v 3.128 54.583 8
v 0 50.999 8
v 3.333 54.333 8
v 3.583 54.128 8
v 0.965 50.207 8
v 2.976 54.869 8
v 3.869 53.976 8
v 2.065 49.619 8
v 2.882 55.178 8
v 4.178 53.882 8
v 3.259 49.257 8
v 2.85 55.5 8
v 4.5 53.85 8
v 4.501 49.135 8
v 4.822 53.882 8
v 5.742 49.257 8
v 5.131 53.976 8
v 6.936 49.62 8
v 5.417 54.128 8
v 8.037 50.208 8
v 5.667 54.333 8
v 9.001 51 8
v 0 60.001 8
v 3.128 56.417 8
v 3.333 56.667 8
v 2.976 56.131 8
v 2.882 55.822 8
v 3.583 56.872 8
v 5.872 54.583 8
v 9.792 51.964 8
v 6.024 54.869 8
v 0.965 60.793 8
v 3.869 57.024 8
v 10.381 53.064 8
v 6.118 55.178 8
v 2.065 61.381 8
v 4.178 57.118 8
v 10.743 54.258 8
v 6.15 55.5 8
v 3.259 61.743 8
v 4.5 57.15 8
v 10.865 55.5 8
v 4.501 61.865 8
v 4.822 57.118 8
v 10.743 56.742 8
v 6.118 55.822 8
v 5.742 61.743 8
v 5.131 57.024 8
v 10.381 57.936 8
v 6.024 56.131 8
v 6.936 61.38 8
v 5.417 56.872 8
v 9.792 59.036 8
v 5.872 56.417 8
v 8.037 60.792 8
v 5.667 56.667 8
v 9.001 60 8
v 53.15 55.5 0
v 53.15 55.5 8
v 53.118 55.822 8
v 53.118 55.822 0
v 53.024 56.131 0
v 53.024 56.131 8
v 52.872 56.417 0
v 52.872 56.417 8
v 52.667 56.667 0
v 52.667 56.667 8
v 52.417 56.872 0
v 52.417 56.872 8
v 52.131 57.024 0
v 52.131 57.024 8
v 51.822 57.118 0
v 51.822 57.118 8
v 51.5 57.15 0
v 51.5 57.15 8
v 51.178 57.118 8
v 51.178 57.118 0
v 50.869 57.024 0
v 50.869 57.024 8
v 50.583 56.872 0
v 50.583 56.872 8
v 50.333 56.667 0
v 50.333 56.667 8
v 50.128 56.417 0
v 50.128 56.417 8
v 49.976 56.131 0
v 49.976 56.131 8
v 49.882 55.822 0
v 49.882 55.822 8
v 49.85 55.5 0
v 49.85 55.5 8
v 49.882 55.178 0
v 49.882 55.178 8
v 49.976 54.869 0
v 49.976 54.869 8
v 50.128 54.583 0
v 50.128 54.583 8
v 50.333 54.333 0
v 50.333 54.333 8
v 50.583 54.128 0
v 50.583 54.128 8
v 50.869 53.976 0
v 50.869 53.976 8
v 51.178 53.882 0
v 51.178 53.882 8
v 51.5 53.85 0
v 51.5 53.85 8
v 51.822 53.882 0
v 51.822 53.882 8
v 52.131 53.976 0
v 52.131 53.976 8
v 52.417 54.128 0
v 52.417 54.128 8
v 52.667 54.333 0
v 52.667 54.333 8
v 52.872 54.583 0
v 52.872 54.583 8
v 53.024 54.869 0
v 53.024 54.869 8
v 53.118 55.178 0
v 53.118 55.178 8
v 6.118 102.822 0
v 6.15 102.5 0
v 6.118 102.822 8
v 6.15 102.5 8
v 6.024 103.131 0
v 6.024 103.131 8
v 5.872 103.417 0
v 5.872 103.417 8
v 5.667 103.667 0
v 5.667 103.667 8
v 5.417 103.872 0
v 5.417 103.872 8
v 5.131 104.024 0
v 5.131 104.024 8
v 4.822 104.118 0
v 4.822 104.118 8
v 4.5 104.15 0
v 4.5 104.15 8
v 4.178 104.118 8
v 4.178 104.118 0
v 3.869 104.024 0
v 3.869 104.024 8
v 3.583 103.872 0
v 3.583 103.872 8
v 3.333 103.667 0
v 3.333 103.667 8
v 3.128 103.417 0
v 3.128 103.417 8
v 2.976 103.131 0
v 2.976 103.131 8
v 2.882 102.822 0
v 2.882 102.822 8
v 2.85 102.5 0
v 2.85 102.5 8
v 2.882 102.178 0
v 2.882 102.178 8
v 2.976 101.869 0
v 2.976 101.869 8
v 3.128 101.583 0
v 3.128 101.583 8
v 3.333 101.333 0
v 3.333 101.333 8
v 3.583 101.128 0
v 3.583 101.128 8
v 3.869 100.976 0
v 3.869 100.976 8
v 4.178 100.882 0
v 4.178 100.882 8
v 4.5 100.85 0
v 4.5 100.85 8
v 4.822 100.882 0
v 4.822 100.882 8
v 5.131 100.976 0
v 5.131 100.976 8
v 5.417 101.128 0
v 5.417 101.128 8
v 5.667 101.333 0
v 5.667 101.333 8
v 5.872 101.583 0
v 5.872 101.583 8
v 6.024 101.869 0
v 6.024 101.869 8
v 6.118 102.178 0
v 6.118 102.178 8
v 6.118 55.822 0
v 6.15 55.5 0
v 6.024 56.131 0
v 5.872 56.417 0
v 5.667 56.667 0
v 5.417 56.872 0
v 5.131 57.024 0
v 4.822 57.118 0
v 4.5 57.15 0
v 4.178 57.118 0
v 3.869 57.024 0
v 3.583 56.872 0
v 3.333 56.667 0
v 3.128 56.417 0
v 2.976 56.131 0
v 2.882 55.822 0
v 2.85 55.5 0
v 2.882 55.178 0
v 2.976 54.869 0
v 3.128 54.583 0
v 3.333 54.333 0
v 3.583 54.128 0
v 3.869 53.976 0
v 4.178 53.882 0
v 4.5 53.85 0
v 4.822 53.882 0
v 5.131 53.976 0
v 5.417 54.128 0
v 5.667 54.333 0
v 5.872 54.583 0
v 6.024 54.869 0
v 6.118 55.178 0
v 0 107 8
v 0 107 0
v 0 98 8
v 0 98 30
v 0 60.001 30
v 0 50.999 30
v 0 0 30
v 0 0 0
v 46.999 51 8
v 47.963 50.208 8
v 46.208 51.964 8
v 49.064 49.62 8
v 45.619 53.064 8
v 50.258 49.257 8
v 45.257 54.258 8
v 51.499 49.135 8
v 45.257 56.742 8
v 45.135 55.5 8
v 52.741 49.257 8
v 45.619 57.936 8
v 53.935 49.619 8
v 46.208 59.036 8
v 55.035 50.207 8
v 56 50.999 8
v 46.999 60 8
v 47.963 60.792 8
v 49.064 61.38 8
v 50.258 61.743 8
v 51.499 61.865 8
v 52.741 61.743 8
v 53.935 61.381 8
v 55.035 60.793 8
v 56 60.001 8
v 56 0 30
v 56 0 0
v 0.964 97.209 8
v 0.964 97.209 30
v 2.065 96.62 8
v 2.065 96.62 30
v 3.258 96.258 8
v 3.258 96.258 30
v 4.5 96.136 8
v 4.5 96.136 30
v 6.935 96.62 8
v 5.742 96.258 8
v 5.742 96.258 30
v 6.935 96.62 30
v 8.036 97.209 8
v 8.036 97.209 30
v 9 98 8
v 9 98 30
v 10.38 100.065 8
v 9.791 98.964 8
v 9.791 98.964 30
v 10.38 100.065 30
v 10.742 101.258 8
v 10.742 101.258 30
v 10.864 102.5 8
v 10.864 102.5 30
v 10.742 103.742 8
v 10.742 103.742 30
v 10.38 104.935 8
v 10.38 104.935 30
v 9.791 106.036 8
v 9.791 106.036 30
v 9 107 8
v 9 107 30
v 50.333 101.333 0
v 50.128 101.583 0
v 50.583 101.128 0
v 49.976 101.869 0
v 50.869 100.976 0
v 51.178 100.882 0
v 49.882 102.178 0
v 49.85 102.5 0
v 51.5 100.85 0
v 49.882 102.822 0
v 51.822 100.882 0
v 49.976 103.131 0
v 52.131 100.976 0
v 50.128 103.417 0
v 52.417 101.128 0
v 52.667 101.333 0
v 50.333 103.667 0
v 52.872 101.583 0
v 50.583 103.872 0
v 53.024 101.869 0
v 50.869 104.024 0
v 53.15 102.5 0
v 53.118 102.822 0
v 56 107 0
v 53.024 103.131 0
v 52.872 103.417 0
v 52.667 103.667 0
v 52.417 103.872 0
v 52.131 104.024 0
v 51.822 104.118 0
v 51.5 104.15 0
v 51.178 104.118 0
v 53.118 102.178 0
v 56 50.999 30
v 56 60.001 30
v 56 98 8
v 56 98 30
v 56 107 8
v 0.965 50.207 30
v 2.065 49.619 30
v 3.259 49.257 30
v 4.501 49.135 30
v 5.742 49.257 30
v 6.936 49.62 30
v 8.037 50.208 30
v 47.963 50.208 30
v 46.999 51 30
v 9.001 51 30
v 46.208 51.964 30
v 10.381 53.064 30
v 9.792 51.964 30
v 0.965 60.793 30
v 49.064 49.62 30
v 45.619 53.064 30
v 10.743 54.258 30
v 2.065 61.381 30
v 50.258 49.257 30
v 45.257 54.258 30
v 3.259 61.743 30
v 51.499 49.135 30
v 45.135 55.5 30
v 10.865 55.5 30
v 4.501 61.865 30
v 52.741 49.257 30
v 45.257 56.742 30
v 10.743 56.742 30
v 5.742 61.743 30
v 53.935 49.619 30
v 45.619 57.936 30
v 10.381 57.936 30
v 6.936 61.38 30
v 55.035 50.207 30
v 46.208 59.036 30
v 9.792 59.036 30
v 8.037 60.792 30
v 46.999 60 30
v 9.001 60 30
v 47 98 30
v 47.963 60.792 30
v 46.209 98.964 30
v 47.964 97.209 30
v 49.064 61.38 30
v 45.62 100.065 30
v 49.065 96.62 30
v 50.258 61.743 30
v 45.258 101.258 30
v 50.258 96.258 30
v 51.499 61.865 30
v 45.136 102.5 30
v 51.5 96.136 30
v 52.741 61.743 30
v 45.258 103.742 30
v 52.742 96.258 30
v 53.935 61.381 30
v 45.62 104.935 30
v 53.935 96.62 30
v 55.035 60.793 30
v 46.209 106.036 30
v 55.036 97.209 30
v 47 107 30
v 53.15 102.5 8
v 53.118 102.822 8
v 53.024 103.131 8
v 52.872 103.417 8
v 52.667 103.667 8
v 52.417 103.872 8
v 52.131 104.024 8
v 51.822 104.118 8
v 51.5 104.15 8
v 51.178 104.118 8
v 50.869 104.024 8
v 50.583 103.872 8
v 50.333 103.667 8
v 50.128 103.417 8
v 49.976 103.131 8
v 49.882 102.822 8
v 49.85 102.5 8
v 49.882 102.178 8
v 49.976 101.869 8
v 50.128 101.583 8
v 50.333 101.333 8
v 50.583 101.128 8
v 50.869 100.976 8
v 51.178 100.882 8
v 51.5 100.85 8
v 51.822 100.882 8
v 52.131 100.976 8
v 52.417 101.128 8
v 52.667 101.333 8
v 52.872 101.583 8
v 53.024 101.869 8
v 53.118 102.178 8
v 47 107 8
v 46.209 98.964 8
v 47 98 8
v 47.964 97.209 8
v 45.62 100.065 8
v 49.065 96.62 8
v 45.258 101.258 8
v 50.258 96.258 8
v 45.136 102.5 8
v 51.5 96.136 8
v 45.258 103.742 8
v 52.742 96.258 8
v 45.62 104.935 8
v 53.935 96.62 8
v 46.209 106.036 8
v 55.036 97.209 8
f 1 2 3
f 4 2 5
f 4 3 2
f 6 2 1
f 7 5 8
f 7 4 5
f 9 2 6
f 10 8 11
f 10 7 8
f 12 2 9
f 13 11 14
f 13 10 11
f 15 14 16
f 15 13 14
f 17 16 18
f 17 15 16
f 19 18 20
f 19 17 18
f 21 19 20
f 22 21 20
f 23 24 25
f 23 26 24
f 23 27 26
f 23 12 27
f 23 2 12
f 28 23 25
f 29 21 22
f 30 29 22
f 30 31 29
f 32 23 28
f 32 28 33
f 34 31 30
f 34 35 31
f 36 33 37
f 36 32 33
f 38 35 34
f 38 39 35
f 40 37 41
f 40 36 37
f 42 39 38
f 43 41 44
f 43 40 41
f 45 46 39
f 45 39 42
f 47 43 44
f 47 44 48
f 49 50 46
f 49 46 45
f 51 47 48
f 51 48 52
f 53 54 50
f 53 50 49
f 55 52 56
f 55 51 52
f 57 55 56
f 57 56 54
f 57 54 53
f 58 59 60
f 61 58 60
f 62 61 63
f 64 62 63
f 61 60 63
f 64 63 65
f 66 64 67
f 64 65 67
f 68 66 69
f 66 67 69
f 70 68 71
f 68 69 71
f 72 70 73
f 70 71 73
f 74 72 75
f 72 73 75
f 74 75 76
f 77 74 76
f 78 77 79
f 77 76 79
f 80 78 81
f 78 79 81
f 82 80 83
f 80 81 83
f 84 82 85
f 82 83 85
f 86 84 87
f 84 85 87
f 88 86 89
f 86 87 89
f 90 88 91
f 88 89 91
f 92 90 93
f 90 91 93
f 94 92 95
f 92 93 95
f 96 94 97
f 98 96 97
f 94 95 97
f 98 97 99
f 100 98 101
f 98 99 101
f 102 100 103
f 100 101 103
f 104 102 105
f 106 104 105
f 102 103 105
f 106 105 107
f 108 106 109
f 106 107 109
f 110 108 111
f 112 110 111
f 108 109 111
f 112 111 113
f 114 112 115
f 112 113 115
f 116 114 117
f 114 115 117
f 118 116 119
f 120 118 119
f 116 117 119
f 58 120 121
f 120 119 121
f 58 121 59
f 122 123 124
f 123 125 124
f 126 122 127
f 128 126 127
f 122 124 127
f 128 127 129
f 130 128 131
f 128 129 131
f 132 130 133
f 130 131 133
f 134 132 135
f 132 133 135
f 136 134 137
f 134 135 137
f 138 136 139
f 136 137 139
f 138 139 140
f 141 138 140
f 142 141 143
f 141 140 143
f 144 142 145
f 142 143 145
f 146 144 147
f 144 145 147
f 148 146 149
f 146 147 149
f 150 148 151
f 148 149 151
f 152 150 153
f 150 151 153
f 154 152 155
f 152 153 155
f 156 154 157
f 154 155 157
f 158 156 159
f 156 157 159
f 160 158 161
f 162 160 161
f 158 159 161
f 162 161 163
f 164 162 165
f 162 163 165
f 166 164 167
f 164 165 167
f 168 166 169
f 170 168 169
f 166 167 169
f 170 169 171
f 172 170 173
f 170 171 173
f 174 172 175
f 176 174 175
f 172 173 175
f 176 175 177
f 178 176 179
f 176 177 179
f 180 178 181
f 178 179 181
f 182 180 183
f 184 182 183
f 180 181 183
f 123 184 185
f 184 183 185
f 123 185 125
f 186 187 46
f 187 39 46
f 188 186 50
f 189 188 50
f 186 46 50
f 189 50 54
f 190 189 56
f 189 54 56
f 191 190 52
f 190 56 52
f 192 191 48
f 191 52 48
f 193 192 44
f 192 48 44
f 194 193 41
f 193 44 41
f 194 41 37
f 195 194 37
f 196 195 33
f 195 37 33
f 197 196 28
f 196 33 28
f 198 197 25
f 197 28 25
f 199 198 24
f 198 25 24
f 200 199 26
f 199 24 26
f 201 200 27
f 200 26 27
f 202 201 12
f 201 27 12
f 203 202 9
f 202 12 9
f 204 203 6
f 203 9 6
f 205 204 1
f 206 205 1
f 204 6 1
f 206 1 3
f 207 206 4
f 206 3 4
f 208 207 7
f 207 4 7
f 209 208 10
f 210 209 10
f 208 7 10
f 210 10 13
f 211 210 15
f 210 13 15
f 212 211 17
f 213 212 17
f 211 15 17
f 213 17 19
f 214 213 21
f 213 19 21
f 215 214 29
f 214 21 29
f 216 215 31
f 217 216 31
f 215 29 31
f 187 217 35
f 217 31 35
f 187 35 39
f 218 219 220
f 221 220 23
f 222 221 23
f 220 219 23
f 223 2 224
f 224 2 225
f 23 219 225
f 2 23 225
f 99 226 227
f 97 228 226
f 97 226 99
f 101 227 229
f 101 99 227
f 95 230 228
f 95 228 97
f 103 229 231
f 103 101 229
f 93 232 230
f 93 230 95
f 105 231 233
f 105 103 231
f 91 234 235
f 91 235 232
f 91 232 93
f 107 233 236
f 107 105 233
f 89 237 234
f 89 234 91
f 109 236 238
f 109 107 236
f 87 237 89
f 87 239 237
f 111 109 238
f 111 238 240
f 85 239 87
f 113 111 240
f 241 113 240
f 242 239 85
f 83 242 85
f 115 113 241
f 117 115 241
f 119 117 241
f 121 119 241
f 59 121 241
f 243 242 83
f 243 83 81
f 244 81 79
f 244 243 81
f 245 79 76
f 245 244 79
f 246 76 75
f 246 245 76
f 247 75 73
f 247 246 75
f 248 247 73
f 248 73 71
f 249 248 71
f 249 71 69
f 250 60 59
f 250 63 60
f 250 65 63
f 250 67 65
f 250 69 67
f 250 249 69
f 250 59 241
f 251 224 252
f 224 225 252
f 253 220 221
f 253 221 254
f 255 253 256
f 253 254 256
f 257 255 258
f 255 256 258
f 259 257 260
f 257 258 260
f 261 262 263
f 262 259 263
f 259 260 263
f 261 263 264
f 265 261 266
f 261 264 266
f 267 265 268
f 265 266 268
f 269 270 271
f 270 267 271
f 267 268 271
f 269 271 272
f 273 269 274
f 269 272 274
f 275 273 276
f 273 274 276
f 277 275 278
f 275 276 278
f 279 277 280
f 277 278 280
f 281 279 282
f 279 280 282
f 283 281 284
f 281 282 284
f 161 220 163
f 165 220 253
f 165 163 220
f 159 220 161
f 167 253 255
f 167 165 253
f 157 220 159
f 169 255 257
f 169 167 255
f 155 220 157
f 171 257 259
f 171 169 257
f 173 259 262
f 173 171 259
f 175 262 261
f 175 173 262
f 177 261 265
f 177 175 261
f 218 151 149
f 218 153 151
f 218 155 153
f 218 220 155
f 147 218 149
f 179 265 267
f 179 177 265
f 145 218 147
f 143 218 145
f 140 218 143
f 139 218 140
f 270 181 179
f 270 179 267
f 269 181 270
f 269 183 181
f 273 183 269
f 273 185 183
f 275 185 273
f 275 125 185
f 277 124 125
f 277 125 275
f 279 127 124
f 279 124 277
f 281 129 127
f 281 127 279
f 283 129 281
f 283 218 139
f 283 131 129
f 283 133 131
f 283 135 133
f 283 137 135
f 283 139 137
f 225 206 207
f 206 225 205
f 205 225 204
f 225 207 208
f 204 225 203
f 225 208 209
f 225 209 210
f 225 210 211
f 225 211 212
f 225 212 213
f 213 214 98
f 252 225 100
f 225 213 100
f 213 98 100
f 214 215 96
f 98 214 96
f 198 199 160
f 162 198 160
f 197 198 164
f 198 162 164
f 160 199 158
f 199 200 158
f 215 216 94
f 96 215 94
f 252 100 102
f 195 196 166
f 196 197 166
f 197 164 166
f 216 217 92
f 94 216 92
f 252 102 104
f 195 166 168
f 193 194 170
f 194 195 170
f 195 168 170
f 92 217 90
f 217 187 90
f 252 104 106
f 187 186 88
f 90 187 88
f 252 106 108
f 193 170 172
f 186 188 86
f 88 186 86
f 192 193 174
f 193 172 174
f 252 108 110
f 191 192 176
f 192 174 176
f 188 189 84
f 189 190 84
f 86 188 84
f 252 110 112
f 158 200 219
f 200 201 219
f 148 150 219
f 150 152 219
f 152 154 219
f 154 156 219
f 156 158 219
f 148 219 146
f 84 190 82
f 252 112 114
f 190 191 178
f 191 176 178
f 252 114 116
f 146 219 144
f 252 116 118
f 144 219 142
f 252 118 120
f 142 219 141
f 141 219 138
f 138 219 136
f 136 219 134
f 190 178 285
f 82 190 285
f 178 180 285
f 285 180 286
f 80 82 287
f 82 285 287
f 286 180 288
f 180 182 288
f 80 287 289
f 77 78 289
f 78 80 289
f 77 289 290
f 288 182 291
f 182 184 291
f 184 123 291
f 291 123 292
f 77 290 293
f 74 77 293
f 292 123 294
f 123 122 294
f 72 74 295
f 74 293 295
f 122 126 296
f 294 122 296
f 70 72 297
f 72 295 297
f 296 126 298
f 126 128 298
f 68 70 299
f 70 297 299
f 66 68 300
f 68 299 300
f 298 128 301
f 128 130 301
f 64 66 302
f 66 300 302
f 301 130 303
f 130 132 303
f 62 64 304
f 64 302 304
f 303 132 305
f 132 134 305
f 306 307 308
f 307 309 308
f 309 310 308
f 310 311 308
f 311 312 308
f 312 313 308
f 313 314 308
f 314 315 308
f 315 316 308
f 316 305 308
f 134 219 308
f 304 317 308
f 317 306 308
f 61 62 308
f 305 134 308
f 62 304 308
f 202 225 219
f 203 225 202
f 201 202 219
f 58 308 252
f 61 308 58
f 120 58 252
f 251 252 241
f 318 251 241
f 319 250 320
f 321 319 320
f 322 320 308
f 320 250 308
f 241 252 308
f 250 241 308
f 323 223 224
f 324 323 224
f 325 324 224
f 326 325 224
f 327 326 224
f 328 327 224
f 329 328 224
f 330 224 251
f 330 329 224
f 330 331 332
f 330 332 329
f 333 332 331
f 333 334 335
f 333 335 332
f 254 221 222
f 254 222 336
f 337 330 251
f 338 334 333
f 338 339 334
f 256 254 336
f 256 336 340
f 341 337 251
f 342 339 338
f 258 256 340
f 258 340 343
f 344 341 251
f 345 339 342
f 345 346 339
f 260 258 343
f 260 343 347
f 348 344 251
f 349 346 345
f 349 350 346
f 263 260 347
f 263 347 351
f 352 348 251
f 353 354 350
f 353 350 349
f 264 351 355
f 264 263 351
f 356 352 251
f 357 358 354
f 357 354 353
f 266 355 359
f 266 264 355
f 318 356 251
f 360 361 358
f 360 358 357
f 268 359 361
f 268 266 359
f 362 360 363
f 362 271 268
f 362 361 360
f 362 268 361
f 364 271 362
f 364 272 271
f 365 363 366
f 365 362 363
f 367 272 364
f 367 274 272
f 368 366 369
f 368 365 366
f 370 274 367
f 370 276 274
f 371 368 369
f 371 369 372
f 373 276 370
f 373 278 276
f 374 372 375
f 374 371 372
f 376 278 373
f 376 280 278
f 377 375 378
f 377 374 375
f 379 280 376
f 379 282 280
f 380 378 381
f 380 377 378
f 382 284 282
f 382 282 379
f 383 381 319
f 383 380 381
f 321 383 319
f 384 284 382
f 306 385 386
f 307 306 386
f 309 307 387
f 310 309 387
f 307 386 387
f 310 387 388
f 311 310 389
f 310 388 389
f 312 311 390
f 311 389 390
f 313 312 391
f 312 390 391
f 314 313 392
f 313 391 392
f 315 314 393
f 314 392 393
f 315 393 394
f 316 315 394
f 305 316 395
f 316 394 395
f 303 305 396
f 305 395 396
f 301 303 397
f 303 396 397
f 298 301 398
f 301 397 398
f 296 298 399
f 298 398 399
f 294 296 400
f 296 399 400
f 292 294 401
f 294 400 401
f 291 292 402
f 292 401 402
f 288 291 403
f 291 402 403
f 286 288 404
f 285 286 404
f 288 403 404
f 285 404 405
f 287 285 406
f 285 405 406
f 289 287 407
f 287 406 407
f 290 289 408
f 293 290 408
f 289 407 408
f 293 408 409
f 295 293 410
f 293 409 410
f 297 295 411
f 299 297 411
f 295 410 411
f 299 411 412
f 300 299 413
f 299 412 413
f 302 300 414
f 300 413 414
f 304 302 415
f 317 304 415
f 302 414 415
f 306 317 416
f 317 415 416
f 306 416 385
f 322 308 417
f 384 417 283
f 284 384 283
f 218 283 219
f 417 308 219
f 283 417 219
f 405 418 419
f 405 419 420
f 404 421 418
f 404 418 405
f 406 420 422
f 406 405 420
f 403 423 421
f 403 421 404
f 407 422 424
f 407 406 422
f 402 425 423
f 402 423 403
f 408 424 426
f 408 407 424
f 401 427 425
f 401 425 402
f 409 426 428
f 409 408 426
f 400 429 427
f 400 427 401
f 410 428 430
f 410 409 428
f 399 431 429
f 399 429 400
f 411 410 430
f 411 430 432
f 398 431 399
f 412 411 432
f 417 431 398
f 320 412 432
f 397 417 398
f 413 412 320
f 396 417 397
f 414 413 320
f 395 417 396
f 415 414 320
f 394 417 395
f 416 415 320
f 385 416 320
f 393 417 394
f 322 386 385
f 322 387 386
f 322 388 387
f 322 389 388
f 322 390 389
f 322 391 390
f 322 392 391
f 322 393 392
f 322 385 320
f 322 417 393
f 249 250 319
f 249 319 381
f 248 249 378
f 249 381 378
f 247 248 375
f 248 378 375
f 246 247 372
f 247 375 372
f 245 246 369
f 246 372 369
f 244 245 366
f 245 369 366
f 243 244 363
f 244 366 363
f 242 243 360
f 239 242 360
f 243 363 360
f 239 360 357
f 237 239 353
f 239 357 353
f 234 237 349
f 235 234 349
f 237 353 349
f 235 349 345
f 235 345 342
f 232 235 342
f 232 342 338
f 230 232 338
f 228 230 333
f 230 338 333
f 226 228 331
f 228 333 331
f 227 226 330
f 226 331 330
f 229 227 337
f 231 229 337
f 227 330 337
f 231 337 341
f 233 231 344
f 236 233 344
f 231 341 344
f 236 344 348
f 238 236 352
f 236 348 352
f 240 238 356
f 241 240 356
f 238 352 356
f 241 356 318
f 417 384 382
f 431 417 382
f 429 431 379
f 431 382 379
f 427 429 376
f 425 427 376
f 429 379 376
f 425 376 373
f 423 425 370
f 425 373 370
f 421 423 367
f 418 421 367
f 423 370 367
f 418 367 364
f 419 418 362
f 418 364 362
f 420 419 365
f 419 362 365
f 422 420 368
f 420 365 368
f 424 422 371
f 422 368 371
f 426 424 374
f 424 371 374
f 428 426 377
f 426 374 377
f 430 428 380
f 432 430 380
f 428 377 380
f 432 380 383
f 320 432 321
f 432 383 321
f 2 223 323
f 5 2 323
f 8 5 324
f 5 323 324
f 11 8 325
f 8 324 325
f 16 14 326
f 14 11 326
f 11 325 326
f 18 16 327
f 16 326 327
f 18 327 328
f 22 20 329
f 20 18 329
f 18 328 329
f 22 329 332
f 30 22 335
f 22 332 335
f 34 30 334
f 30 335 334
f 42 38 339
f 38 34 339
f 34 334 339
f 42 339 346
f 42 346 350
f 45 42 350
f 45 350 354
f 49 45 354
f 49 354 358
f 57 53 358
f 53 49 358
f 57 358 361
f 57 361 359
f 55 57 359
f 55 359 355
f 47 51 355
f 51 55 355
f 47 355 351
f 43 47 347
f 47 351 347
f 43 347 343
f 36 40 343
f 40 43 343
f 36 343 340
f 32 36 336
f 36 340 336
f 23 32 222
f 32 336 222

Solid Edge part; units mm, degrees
sketch "Sketch1" plane through (0, 0, 0) normal (0, 0, 1) x (1, 0, 0)
  line L0 (0, 0) -> (56, 0)
  line L1 (56, 0) -> (56, 107)
  line L2 (56, 107) -> (0, 107)
  line L3 (0, 107) -> (0, 0)
  dimension "D1" = 56
  dimension "D2" = 107
extrude "Protrusion1" add sketch "Sketch1" along normal blind 30
sketch "Sketch2" plane through (28, 53.5, 30) normal (0, 0, 1) x (1, 0, 0)
  circle A0 centre (23.5, 49) radius 1.65
  circle A1 centre (-23.5, 2) radius 1.65
  circle A2 centre (23.5, 2) radius 1.65
  circle A3 centre (-23.5, 49) radius 1.65
  dimension "D1" = 3.3
  dimension "D2" = 3.3
extrude "ExtrudedCutout_1" cut sketch "Sketch2" against normal blind 30
sketch "Sketch3" plane through (28, 53.5, 30) normal (0, 0, 1) x (1, 0, 0)
  circle A0 centre (23.5, 49) radius 6.364
  circle A1 centre (-23.5, 2) radius 6.365
  circle A2 centre (23.5, 2) radius 6.365
  circle A3 centre (-23.5, 49) radius 6.364
  dimension "D1" = 12.7279
  dimension "D2" = 12.7279
  dimension "D3" = 12.73
extrude "ExtrudedCutout_2" cut sketch "Sketch3" against normal blind 22
